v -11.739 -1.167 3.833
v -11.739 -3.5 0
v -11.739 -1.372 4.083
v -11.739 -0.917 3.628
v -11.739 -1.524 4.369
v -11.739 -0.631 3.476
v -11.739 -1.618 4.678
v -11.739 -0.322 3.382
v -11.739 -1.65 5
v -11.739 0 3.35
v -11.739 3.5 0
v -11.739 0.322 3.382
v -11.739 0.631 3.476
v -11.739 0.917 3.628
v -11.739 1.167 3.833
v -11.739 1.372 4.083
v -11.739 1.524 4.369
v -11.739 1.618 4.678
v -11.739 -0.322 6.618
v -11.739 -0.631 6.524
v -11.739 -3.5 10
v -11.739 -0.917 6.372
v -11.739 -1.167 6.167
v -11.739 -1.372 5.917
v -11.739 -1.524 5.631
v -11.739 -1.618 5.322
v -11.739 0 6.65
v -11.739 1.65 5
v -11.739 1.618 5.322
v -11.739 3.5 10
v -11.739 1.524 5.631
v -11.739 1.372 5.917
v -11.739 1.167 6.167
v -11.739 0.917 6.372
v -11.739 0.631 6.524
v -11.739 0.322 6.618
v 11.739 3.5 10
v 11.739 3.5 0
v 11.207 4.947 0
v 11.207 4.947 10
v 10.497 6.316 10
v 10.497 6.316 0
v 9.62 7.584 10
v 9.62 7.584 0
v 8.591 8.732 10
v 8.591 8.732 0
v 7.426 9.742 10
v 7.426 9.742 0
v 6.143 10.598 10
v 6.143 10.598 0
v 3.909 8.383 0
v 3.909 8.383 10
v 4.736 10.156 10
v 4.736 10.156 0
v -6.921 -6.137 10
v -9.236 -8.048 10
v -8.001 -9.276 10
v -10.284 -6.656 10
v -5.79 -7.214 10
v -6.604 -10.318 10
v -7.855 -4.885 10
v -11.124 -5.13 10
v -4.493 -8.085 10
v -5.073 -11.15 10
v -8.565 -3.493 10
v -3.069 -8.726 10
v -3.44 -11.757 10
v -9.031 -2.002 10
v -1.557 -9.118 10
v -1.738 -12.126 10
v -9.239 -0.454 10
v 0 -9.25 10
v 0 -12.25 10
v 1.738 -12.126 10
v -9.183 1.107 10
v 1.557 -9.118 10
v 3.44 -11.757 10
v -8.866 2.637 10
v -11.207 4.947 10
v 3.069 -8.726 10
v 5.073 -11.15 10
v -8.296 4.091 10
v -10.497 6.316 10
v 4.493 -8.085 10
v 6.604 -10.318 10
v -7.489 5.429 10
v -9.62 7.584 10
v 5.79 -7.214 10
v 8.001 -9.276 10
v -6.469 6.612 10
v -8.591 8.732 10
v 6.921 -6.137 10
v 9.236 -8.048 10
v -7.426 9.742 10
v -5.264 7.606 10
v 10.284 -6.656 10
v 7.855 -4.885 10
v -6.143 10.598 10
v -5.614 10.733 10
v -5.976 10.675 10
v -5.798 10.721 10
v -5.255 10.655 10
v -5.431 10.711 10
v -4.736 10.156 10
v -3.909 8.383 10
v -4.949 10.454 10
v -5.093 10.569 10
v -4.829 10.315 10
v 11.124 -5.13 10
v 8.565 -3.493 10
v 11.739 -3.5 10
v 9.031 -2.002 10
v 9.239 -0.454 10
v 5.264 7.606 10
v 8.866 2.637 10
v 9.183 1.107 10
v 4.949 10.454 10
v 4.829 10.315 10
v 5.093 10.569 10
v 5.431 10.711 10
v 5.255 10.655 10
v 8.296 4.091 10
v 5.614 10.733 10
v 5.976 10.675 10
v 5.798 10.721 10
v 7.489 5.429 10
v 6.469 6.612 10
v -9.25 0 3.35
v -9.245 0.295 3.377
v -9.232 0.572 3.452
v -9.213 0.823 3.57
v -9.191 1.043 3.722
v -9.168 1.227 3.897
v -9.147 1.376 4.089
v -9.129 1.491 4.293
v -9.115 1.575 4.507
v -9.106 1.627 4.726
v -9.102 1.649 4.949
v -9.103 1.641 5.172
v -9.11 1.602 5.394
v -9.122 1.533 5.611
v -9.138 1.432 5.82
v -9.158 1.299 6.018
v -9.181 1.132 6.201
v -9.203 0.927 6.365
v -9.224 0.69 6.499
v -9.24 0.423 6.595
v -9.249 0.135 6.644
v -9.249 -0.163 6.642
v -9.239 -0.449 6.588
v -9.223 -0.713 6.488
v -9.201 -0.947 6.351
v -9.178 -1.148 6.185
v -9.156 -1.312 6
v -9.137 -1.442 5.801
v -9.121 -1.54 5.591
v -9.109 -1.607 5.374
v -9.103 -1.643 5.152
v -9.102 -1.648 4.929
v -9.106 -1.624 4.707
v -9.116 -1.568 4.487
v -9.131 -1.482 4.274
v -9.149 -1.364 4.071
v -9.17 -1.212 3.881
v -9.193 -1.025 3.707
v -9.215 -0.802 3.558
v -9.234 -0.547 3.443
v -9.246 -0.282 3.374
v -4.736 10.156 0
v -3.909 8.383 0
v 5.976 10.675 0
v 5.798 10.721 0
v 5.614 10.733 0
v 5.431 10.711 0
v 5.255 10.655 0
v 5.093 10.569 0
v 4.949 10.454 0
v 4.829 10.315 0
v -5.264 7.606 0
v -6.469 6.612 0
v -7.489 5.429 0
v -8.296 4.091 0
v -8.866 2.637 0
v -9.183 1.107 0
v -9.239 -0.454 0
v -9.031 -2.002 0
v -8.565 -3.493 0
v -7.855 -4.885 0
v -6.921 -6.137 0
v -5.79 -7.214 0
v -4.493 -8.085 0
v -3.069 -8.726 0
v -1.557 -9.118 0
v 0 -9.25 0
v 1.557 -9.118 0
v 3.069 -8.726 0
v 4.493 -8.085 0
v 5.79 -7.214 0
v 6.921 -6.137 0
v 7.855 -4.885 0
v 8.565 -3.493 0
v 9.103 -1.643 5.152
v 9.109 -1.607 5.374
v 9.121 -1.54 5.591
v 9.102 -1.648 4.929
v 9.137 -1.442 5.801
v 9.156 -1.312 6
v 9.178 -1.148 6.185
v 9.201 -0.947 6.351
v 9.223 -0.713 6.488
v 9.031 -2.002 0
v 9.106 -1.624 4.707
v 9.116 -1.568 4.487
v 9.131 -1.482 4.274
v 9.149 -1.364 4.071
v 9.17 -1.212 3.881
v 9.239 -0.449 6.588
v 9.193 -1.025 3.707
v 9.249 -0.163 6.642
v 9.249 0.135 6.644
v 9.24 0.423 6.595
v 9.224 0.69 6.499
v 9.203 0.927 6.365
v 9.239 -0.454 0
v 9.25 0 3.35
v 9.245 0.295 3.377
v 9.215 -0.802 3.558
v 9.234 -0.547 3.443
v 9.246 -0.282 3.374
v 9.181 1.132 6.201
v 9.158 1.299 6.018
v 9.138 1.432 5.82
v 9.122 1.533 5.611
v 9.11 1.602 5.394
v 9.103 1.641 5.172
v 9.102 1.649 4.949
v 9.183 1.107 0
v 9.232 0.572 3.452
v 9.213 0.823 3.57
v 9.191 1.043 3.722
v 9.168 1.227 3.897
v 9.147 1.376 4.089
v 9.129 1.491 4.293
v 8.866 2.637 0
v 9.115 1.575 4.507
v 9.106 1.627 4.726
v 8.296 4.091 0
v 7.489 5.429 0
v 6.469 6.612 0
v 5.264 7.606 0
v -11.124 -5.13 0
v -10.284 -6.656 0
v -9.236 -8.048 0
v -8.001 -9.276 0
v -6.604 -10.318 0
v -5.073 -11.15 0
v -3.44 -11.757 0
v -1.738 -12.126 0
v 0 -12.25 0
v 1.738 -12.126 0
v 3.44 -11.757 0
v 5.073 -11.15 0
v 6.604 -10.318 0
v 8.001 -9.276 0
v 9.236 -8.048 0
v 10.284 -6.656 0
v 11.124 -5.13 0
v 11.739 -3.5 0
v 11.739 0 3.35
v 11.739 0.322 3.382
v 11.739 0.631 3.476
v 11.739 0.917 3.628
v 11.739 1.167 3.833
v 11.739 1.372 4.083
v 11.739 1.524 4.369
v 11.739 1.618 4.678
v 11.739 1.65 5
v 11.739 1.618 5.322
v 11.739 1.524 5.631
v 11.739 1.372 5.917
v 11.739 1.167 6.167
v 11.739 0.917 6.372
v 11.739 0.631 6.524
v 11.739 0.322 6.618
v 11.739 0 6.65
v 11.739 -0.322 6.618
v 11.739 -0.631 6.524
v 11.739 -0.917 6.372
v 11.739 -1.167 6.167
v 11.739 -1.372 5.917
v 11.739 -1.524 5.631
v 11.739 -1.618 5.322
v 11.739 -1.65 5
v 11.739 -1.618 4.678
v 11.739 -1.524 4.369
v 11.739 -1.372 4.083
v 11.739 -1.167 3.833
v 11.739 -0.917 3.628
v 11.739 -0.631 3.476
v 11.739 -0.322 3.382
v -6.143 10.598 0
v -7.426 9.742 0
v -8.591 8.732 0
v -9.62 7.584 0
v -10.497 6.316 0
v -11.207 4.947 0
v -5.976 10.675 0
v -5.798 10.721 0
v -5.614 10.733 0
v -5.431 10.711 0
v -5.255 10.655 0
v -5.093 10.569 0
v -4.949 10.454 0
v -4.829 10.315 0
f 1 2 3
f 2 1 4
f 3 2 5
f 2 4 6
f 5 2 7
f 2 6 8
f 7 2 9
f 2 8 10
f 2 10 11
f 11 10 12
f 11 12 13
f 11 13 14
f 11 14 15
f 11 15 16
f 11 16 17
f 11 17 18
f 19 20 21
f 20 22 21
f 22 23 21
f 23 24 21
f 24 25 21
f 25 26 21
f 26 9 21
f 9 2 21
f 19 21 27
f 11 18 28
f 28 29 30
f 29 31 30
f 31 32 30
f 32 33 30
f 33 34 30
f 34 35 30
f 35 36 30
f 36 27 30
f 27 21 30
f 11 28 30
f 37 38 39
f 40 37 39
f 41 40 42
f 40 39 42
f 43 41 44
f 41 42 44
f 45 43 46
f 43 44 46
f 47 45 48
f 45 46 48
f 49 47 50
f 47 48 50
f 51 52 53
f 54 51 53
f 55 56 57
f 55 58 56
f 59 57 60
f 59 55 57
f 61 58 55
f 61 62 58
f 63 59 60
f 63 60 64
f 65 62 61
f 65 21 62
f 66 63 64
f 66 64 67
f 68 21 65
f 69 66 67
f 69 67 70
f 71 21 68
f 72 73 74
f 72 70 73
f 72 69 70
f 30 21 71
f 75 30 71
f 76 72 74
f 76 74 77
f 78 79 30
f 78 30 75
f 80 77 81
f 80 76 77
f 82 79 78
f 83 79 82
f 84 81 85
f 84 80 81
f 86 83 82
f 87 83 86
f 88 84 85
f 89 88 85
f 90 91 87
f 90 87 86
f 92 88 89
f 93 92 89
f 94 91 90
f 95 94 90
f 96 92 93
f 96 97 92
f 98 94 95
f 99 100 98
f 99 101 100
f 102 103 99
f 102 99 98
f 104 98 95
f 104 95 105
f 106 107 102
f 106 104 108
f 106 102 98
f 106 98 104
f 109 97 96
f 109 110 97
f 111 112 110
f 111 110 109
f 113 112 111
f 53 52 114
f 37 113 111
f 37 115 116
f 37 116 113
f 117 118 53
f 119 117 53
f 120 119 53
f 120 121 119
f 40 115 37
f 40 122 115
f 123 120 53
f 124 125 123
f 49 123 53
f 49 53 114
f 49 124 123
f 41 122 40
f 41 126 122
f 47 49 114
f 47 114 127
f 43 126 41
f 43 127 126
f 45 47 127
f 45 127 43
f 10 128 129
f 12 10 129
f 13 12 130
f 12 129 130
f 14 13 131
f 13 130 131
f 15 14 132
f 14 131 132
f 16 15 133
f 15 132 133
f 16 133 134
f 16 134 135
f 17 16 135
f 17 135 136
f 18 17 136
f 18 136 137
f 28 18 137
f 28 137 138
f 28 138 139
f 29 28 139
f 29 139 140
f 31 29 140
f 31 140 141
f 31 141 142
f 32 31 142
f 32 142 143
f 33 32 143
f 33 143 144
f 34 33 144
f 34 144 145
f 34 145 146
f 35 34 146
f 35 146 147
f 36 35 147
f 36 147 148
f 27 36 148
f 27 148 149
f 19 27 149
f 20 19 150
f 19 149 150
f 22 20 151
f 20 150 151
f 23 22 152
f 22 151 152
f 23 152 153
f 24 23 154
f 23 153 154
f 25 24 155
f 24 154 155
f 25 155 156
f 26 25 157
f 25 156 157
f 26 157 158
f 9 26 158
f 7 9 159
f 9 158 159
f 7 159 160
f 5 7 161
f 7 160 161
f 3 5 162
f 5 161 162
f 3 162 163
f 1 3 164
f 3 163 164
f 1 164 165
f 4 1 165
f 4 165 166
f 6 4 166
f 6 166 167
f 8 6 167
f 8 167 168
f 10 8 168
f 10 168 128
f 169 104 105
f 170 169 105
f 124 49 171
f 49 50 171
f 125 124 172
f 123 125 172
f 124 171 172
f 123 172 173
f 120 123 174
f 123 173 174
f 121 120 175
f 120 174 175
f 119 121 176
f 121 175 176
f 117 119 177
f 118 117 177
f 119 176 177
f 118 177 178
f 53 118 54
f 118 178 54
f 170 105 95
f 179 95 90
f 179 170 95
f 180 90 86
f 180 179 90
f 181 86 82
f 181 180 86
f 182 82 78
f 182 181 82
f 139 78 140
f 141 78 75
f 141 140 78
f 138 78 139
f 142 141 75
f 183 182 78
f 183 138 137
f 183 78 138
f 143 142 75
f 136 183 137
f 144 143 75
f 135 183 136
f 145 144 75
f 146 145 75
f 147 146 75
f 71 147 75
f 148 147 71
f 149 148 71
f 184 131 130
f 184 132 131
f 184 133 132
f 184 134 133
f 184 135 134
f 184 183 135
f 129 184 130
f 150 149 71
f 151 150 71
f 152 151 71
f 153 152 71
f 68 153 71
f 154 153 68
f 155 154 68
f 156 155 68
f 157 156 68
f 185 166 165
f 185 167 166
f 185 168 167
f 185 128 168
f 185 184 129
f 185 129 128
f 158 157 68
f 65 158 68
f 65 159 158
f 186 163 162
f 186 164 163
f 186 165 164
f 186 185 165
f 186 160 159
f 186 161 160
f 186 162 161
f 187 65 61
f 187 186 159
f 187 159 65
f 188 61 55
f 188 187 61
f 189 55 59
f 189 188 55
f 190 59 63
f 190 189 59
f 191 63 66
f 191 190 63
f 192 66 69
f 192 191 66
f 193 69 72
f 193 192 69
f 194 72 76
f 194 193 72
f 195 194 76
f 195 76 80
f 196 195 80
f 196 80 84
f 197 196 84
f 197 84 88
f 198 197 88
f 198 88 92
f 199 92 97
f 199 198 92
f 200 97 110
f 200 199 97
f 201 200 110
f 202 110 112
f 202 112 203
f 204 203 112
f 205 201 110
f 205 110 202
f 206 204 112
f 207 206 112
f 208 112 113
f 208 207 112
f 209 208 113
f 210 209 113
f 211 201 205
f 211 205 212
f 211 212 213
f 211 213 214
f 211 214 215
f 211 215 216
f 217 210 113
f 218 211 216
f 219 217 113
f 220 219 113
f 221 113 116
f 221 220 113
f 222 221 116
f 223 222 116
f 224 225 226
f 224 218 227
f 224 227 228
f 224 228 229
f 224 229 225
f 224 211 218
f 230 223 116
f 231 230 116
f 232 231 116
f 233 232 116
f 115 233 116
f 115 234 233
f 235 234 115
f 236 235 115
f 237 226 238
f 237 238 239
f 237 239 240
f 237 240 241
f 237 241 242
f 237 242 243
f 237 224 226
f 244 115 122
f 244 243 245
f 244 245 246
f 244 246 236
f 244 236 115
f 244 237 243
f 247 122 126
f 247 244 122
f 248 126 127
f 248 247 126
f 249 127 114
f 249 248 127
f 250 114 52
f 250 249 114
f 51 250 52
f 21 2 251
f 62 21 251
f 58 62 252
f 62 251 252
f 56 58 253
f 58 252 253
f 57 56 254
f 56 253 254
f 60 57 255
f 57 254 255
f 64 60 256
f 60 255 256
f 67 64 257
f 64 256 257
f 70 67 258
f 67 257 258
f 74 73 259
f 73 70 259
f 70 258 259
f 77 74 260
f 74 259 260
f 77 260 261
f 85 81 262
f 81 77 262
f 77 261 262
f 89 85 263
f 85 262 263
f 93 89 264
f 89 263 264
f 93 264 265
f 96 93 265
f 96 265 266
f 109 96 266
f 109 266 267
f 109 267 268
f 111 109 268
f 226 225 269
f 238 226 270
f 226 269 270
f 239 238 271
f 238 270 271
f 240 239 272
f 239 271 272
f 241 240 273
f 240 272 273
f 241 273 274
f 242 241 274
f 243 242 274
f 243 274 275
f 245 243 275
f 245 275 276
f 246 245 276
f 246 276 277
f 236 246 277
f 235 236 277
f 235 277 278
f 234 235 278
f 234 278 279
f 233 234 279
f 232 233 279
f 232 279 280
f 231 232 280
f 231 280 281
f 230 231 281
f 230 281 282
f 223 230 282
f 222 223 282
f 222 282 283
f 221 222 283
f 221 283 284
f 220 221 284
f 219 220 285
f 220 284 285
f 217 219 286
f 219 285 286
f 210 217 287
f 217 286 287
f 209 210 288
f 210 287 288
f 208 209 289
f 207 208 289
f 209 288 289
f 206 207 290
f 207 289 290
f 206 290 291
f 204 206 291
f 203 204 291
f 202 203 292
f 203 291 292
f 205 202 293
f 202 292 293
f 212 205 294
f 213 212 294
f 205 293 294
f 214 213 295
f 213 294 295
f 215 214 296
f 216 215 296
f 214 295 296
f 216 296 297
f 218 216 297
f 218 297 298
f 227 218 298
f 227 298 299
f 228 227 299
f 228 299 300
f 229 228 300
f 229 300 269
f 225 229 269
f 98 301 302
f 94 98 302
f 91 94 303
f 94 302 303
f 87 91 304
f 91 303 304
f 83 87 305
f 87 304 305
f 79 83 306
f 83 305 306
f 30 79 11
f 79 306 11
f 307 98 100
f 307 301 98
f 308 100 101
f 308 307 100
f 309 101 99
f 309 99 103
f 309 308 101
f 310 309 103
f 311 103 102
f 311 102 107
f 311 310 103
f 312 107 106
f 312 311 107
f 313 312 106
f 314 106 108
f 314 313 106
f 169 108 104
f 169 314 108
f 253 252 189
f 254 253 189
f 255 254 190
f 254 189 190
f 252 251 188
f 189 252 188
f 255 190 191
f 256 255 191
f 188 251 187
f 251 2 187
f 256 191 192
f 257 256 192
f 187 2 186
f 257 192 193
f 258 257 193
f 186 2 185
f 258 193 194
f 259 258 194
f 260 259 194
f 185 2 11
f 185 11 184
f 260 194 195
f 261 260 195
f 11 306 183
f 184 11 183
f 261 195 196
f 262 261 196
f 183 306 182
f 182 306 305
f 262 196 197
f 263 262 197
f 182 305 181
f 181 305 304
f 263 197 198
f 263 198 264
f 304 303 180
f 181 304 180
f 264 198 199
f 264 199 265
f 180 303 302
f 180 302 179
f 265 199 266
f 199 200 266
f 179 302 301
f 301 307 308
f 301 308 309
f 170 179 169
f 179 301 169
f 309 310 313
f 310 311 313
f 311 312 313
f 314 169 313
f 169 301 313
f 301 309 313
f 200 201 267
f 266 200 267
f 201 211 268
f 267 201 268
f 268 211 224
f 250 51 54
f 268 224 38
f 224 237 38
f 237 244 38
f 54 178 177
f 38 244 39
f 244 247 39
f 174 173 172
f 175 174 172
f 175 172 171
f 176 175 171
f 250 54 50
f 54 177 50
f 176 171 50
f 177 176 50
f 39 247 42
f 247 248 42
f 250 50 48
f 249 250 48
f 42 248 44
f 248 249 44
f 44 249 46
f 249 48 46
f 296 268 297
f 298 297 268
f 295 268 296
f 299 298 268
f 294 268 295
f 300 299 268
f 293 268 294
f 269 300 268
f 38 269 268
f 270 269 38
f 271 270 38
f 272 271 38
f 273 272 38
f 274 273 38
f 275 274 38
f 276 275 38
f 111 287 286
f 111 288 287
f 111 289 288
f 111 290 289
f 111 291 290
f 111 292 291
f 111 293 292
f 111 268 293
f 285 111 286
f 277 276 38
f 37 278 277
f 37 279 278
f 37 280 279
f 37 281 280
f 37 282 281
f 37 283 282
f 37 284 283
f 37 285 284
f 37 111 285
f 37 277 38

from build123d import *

# Parameters (mm, degrees)
SKETCH_1_R               = 12.25
SKETCH_1_R_2             = 9.25
EXTRUDE_1_DEPTH          = 10
CUT_EXTRUDE_1_DEPTH      = 1
CUT_EXTRUDE_1_DEPTH_BACK = 11
SKETCH_3_W               = 9.638758803
SKETCH_3_H               = 7
CUT_EXTRUDE_2_DEPTH      = 11
SKETCH_4_R               = 1.65
CUT_EXTRUDE_3_DEPTH      = 24.478713764
FILLET_1_R               = 1


with BuildPart() as part:
    # ｽｹｯﾁ1 → ﾎﾞｽ - 押し出し1 (new body)
    with BuildSketch(Plane.XY):
        Circle(SKETCH_1_R)
        Circle(SKETCH_1_R_2, mode=Mode.SUBTRACT)
    extrude(amount=EXTRUDE_1_DEPTH)

    # ｽｹｯﾁ2 → ｶｯﾄ - 押し出し1 (cut, two sides)
    with BuildSketch(Plane.XY.offset(10)) as cut_extrude_1_sk:
        with BuildLine():
            Line((-5.177073706, 11.102270391), (-3.909218921, 8.38334703))
            ThreePointArc((-3.909218921, 8.38334703), (0, 9.25), (3.909218921, 8.38334703))
            Line((3.909218921, 8.38334703), (5.177073706, 11.102270391))
            ThreePointArc((5.177073706, 11.102270391), (0, 12.25), (-5.177073706, 11.102270391))
        make_face()
    extrude(amount=CUT_EXTRUDE_1_DEPTH, mode=Mode.SUBTRACT)
    extrude(cut_extrude_1_sk.sketch, amount=-CUT_EXTRUDE_1_DEPTH_BACK, mode=Mode.SUBTRACT)

    # ｽｹｯﾁ3 → ｶｯﾄ - 押し出し2 (cut, through all)
    with BuildSketch(Plane.XY.offset(10)):
        with Locations((-16.558736284, 0)):
            Rectangle(SKETCH_3_W, SKETCH_3_H)
        with Locations((16.558736284, 0)):
            Rectangle(SKETCH_3_W, SKETCH_3_H)
    extrude(amount=-CUT_EXTRUDE_2_DEPTH, mode=Mode.SUBTRACT)

    # ｽｹｯﾁ4 → ｶｯﾄ - 押し出し3 (cut, through all)
    with BuildSketch(Plane(origin=(11.739356882, 0, 0), x_dir=(0, 0, -1), z_dir=(1, 0, 0))):
        with Locations((-5, 0)):
            Circle(SKETCH_4_R)
    extrude(amount=-CUT_EXTRUDE_3_DEPTH, mode=Mode.SUBTRACT)

    # ﾌｨﾚｯﾄ1
    fillet_1_edges = [part.edges().sort_by_distance(p)[0] for p in [
        (-5.177073706, 11.102270391, 5),
        (5.177073706, 11.102270391, 5),
    ]]
    fillet(fillet_1_edges, radius=FILLET_1_R)


solid = part.part
